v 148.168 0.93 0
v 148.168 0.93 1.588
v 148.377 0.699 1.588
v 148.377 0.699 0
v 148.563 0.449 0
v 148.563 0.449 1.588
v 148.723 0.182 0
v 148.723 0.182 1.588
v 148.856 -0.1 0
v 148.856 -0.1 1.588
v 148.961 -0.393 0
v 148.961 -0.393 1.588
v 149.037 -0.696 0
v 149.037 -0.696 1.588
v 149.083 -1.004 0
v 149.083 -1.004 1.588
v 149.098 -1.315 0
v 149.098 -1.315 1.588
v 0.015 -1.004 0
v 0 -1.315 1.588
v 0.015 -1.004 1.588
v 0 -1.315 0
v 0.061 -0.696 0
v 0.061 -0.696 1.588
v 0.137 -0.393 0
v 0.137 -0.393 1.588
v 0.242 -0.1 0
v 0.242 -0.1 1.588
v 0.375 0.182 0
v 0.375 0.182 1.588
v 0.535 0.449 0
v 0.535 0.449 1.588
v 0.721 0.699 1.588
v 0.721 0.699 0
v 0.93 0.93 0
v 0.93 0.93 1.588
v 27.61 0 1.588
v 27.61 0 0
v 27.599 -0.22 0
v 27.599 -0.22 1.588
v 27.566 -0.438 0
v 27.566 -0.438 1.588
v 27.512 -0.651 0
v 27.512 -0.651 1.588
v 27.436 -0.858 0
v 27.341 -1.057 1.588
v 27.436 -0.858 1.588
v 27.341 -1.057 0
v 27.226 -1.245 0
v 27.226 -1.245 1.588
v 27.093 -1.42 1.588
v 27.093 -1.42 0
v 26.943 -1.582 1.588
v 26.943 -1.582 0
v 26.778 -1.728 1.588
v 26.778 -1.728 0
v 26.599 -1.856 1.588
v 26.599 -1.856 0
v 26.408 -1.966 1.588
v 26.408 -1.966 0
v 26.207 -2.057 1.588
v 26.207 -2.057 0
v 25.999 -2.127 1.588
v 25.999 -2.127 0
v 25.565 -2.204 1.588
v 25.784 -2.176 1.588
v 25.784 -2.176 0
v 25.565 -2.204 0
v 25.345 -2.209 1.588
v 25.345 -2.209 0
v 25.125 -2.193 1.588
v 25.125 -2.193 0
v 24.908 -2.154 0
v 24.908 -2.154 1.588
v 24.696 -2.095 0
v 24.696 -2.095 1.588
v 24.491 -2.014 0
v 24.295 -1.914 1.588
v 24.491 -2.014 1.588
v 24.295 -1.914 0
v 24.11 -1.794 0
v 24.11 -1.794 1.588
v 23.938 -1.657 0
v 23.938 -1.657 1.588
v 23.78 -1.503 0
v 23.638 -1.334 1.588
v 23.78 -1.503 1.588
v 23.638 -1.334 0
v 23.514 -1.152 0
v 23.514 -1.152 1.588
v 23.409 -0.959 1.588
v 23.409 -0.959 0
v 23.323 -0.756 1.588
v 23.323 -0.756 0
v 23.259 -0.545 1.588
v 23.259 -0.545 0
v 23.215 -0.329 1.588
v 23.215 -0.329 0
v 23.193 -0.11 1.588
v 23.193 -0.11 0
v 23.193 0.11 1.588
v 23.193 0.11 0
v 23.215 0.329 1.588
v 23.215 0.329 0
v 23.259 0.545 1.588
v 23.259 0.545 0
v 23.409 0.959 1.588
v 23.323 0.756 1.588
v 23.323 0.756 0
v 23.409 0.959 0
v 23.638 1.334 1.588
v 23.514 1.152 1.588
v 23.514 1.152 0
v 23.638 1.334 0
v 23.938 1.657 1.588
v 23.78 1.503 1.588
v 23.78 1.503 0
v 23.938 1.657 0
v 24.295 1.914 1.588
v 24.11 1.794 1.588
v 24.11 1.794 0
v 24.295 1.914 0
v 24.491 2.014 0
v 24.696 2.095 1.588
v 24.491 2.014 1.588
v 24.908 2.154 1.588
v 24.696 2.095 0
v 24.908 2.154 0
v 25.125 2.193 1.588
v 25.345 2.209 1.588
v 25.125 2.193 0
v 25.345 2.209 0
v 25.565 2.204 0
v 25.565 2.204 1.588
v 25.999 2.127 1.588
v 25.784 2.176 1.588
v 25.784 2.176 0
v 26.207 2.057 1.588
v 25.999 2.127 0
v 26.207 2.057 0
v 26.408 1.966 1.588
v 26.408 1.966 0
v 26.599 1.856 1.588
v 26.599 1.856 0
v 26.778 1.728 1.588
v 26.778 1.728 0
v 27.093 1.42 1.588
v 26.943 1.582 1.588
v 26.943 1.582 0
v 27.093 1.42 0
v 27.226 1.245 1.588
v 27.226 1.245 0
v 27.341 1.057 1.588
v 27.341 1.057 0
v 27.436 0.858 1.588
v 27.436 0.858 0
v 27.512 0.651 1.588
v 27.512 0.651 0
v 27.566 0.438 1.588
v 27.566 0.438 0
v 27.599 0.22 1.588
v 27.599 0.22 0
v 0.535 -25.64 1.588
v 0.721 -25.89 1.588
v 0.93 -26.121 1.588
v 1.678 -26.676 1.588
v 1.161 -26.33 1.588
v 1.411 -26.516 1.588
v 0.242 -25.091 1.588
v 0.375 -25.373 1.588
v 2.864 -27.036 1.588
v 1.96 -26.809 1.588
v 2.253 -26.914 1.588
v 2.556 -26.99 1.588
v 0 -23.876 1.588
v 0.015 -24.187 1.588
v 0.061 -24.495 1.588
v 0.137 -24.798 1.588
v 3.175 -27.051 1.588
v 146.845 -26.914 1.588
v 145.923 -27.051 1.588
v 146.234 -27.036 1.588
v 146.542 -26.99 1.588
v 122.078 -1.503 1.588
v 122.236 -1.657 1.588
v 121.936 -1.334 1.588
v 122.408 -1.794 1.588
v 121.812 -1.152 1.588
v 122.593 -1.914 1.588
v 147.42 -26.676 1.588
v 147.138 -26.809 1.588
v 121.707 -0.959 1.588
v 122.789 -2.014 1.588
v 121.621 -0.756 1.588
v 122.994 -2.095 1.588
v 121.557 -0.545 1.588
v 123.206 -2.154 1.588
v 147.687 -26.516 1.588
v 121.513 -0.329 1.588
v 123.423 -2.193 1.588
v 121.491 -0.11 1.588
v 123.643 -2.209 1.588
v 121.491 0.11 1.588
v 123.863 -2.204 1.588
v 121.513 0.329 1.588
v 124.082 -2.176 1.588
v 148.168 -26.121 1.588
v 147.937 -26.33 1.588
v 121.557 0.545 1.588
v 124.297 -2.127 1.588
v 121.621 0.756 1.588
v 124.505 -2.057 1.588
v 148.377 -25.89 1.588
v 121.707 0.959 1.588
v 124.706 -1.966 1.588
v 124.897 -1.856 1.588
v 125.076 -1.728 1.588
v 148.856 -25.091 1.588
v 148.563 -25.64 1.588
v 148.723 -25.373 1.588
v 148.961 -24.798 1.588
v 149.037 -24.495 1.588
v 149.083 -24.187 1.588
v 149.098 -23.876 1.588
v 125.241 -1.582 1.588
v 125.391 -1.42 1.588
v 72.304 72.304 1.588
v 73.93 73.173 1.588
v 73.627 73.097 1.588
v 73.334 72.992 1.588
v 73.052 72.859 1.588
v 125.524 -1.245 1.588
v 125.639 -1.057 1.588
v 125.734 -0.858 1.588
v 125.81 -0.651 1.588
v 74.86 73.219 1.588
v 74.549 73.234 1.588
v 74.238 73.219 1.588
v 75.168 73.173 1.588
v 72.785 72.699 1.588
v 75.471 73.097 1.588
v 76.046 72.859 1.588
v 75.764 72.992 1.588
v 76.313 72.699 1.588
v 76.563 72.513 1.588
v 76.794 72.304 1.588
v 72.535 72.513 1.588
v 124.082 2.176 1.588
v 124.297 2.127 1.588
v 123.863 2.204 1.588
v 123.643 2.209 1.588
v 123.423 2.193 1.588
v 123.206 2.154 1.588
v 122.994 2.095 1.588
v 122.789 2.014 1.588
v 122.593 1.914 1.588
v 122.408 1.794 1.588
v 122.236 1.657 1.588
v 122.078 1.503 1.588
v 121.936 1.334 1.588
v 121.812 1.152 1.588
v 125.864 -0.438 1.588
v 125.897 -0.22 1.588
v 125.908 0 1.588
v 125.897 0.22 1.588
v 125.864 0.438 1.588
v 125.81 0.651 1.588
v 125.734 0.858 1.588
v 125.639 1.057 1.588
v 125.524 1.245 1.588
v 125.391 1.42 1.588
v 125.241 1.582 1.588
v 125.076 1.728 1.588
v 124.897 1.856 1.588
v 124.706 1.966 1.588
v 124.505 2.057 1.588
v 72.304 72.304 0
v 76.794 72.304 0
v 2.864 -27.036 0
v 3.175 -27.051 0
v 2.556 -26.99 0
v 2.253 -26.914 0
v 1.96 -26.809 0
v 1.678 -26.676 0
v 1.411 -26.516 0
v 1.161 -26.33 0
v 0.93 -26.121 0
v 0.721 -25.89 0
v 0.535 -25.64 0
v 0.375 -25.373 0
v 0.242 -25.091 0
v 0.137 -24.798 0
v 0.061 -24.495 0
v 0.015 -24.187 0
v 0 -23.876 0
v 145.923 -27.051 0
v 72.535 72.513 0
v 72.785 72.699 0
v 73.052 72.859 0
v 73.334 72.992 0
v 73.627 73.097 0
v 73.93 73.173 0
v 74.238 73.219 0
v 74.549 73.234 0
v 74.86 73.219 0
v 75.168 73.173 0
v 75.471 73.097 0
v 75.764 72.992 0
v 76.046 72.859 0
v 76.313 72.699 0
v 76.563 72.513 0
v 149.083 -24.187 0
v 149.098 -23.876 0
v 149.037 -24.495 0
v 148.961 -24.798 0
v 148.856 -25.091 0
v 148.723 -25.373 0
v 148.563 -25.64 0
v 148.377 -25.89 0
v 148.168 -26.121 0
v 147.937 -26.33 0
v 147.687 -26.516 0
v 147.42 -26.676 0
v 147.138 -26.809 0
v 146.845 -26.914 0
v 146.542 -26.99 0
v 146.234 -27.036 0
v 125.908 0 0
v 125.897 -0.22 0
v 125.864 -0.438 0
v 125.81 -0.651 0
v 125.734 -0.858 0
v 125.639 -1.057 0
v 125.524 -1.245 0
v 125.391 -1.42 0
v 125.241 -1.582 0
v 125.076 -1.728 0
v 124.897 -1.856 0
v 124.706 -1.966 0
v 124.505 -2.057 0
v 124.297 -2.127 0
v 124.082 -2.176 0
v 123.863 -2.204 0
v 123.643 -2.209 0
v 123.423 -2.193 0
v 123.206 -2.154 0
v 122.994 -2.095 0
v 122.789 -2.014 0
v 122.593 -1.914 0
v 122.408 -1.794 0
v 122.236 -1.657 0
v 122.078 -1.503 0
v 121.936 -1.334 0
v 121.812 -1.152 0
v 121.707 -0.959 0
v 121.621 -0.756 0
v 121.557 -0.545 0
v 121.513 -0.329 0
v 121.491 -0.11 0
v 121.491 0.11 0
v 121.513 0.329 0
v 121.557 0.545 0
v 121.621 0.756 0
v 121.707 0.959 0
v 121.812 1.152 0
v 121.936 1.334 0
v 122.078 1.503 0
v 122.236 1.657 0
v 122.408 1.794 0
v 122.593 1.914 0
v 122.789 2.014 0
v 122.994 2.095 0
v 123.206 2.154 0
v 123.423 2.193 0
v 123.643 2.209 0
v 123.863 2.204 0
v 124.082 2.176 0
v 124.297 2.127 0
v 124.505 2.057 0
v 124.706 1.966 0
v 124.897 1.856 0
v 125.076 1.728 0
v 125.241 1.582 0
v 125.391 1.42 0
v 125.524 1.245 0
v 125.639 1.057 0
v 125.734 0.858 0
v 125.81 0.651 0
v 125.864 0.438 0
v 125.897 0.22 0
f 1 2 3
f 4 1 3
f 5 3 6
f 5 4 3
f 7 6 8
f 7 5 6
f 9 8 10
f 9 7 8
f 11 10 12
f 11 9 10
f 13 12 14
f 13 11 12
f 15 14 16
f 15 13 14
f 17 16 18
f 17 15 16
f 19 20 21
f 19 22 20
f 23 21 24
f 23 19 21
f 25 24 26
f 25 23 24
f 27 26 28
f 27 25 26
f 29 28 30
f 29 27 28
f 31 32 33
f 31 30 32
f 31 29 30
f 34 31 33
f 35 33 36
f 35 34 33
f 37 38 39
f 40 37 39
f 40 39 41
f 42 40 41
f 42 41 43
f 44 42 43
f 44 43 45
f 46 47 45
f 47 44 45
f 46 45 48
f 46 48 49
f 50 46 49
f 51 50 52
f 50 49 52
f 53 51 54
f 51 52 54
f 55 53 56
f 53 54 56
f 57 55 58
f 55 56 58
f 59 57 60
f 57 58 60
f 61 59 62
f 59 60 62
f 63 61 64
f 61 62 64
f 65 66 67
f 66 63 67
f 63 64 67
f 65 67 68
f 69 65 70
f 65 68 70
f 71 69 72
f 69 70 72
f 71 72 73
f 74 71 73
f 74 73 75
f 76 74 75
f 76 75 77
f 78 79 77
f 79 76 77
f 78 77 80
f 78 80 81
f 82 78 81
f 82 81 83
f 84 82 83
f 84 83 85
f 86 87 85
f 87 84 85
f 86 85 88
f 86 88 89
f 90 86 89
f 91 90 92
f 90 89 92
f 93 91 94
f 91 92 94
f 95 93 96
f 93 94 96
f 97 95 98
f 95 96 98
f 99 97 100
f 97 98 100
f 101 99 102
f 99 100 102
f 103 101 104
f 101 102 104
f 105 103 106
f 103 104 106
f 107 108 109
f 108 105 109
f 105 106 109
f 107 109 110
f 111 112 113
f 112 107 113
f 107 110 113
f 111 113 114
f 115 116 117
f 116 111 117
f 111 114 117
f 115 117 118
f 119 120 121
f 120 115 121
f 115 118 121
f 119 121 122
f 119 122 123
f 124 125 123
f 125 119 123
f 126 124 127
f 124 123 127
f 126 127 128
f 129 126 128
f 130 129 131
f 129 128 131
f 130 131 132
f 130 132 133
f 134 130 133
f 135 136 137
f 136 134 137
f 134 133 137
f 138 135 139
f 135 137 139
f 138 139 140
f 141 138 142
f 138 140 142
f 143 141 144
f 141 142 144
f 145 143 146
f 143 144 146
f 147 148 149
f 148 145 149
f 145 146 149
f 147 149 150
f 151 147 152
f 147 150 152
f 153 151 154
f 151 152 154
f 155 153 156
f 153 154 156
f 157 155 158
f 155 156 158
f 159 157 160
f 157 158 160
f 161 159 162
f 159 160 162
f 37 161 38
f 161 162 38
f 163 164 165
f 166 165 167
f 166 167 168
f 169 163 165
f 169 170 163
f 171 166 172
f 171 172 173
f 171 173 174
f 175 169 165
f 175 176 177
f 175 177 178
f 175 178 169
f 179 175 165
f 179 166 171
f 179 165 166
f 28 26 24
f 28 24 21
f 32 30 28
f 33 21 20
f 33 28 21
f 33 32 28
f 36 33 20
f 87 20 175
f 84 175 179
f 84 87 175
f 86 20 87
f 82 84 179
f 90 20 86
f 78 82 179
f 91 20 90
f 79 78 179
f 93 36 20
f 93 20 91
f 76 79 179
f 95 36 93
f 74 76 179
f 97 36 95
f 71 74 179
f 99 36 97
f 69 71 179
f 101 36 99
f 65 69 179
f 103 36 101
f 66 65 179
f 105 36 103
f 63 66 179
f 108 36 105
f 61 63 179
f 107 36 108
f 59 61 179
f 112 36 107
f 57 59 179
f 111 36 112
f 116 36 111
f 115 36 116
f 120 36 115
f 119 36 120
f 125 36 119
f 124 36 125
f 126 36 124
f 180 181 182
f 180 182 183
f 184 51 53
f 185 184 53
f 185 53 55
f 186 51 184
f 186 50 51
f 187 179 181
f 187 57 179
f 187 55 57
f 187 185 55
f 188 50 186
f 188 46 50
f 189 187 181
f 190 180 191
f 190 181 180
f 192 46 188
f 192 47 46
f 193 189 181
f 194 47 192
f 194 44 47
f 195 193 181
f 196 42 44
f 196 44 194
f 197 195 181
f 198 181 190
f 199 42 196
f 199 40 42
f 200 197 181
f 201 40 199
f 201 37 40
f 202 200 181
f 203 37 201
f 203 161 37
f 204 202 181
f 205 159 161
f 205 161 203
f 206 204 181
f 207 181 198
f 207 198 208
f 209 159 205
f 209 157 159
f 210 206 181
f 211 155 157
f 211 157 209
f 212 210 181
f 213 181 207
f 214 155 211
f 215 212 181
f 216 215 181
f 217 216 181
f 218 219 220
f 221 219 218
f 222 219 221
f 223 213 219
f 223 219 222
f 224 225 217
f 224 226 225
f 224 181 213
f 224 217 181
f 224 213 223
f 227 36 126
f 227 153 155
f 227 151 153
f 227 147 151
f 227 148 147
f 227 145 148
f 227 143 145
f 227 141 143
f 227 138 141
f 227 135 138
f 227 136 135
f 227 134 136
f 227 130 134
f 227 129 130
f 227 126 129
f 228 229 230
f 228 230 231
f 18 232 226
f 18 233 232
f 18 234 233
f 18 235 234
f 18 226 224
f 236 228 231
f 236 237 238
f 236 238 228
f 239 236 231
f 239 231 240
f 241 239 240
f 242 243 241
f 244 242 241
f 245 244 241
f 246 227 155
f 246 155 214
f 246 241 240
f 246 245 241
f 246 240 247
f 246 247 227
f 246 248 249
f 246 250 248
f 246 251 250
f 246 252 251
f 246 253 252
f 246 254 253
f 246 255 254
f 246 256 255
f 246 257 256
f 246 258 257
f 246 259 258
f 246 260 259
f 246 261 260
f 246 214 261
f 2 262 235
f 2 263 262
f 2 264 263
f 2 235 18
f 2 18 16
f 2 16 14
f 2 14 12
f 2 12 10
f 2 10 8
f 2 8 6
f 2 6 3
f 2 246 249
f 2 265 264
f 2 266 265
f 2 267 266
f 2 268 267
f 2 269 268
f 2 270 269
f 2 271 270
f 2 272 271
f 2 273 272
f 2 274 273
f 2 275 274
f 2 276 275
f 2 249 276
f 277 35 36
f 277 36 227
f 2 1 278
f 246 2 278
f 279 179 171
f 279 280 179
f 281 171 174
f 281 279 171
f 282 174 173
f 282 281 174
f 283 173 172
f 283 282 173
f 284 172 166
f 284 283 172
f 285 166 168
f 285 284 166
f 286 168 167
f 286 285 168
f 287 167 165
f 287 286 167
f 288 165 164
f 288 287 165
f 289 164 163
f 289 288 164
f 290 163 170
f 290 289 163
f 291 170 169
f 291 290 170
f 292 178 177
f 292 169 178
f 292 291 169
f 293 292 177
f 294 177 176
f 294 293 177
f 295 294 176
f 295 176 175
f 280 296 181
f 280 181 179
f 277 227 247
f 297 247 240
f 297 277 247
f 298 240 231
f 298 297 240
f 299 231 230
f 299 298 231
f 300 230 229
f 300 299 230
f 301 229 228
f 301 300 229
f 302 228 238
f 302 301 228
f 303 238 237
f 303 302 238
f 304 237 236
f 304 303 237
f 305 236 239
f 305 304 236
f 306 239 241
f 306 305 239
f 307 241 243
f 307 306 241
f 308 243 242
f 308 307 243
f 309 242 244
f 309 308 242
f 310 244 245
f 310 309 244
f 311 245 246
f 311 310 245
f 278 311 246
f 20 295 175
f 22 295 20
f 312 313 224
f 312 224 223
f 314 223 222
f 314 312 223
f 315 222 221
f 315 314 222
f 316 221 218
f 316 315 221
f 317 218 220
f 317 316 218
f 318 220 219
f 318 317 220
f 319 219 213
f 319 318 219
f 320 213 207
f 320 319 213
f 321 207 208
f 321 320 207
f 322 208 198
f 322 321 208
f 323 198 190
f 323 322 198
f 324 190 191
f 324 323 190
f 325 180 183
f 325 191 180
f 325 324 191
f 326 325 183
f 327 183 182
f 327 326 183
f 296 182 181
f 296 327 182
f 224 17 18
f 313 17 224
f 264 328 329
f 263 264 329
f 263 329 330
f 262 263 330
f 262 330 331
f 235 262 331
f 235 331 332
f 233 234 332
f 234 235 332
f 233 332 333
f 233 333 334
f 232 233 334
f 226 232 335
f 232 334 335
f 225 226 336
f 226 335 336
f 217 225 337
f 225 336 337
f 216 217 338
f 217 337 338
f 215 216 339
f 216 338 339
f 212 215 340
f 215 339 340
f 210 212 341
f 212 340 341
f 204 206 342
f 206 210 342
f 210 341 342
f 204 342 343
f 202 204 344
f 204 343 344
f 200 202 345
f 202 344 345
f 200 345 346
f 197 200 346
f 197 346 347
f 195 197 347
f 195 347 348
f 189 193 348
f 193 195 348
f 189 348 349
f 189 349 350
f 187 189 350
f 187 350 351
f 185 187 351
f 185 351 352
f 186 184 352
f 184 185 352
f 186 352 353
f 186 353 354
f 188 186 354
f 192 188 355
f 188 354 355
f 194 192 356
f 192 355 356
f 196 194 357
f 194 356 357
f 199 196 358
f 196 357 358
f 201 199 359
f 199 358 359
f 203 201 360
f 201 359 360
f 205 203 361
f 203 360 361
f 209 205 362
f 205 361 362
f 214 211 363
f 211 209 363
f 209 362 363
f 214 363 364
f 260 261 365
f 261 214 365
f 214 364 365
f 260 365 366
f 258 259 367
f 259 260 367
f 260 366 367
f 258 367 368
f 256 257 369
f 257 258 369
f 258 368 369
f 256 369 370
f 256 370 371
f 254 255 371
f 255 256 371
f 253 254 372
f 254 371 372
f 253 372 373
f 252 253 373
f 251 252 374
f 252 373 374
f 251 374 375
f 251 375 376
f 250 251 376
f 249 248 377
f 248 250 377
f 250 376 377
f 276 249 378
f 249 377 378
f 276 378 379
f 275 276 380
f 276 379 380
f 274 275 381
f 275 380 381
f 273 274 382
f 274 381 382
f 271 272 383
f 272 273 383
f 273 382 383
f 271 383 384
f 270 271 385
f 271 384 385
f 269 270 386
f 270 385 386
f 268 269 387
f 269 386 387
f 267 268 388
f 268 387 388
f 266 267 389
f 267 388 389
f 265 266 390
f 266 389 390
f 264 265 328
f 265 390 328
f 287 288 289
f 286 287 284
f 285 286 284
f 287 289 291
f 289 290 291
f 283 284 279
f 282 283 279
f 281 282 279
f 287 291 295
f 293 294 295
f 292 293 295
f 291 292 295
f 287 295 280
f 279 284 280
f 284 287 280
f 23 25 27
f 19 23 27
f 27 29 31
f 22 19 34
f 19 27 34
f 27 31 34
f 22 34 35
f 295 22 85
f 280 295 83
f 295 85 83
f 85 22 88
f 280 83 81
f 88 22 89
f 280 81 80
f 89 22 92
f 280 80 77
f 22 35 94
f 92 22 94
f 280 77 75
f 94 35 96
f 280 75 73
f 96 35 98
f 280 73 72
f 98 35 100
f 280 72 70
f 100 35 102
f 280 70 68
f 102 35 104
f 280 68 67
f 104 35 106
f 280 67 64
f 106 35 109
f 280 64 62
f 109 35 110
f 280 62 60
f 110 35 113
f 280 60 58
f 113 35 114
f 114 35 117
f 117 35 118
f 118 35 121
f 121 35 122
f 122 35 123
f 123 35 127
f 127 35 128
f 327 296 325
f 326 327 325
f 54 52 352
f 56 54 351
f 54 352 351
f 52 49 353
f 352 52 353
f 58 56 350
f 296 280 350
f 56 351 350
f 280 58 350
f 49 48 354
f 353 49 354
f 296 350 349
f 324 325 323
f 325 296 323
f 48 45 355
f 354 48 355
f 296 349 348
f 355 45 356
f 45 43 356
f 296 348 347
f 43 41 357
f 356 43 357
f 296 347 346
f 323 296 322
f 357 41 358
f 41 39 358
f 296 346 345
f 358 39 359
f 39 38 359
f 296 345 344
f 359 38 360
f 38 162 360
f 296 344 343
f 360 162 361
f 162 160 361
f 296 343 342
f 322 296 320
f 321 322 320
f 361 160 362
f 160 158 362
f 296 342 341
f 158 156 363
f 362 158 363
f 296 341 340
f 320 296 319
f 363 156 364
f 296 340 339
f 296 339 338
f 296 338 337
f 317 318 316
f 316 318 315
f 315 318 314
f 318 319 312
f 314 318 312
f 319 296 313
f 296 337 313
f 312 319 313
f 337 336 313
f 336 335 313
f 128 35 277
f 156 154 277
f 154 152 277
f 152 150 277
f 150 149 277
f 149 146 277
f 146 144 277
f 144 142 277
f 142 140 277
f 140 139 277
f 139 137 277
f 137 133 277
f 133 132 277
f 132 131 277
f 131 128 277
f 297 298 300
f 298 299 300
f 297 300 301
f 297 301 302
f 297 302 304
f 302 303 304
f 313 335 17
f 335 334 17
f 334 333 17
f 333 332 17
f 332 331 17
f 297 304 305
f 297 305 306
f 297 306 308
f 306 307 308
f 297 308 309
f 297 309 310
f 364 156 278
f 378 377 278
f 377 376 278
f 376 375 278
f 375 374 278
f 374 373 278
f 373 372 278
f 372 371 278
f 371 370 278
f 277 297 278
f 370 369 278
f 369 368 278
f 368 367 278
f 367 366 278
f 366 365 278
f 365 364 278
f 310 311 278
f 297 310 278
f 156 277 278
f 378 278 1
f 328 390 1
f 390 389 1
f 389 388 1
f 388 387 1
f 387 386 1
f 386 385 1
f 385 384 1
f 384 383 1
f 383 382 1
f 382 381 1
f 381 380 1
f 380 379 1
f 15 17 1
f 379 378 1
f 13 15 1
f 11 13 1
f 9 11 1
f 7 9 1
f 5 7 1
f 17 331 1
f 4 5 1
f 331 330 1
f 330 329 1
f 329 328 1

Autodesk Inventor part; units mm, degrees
ref_plane "YZ Plane" through (0, 0, 0) normal (1, 0, 0) x (0, 1, 0)
ref_plane "XZ Plane" through (0, 0, 0) normal (0, 1, 0) x (-1, 0, 0)
ref_plane "XY Plane" through (0, 0, 0) normal (0, 0, 1) x (1, 0, 0)
sketch "Sketch1" plane through (0, 0, 0) normal (0, 0, 1) x (1, 0, 0)
  arc A0 (145.923, -27.051) -> (149.098, -23.876) centre (145.923, -23.876) ccw
  line L0 (149.098, -1.3151) -> (149.098, -23.876)
  line L1 (0, -23.876) -> (0, -1.3151)
  line L2 (148.1681, 0.9299) -> (76.7941, 72.3039)
  line L3 (0.9299, 0.9299) -> (72.3039, 72.3039)
  circle A1 centre (25.4, 0) radius 2.2098
  circle A2 centre (123.698, 0) radius 2.2098
  arc A3 (0, -23.876) -> (3.175, -27.051) centre (3.175, -23.876) ccw
  arc A4 (76.7941, 72.3039) -> (72.3039, 72.3039) centre (74.549, 70.0589) ccw
  arc A5 (0.9299, 0.9299) -> (0, -1.3151) centre (3.175, -1.3151) ccw
  arc A6 (149.098, -1.3151) -> (148.1681, 0.9299) centre (145.923, -1.3151) ccw
  line L4 (74.549, 73.2339) -> (74.549, -27.051)
  line L5 (145.923, -27.051) -> (3.175, -27.051)
  point P0 (0, 0)
  point P1 (76.7941, 72.3039)
  point P2 (0, -1.3151)
  point P3 (74.549, 23.0914)
  point P4 (3.175, -27.051)
extrude "Extrusion1" add sketch "Sketch1" along normal blind 1.5875
properties part number "alignernew"
